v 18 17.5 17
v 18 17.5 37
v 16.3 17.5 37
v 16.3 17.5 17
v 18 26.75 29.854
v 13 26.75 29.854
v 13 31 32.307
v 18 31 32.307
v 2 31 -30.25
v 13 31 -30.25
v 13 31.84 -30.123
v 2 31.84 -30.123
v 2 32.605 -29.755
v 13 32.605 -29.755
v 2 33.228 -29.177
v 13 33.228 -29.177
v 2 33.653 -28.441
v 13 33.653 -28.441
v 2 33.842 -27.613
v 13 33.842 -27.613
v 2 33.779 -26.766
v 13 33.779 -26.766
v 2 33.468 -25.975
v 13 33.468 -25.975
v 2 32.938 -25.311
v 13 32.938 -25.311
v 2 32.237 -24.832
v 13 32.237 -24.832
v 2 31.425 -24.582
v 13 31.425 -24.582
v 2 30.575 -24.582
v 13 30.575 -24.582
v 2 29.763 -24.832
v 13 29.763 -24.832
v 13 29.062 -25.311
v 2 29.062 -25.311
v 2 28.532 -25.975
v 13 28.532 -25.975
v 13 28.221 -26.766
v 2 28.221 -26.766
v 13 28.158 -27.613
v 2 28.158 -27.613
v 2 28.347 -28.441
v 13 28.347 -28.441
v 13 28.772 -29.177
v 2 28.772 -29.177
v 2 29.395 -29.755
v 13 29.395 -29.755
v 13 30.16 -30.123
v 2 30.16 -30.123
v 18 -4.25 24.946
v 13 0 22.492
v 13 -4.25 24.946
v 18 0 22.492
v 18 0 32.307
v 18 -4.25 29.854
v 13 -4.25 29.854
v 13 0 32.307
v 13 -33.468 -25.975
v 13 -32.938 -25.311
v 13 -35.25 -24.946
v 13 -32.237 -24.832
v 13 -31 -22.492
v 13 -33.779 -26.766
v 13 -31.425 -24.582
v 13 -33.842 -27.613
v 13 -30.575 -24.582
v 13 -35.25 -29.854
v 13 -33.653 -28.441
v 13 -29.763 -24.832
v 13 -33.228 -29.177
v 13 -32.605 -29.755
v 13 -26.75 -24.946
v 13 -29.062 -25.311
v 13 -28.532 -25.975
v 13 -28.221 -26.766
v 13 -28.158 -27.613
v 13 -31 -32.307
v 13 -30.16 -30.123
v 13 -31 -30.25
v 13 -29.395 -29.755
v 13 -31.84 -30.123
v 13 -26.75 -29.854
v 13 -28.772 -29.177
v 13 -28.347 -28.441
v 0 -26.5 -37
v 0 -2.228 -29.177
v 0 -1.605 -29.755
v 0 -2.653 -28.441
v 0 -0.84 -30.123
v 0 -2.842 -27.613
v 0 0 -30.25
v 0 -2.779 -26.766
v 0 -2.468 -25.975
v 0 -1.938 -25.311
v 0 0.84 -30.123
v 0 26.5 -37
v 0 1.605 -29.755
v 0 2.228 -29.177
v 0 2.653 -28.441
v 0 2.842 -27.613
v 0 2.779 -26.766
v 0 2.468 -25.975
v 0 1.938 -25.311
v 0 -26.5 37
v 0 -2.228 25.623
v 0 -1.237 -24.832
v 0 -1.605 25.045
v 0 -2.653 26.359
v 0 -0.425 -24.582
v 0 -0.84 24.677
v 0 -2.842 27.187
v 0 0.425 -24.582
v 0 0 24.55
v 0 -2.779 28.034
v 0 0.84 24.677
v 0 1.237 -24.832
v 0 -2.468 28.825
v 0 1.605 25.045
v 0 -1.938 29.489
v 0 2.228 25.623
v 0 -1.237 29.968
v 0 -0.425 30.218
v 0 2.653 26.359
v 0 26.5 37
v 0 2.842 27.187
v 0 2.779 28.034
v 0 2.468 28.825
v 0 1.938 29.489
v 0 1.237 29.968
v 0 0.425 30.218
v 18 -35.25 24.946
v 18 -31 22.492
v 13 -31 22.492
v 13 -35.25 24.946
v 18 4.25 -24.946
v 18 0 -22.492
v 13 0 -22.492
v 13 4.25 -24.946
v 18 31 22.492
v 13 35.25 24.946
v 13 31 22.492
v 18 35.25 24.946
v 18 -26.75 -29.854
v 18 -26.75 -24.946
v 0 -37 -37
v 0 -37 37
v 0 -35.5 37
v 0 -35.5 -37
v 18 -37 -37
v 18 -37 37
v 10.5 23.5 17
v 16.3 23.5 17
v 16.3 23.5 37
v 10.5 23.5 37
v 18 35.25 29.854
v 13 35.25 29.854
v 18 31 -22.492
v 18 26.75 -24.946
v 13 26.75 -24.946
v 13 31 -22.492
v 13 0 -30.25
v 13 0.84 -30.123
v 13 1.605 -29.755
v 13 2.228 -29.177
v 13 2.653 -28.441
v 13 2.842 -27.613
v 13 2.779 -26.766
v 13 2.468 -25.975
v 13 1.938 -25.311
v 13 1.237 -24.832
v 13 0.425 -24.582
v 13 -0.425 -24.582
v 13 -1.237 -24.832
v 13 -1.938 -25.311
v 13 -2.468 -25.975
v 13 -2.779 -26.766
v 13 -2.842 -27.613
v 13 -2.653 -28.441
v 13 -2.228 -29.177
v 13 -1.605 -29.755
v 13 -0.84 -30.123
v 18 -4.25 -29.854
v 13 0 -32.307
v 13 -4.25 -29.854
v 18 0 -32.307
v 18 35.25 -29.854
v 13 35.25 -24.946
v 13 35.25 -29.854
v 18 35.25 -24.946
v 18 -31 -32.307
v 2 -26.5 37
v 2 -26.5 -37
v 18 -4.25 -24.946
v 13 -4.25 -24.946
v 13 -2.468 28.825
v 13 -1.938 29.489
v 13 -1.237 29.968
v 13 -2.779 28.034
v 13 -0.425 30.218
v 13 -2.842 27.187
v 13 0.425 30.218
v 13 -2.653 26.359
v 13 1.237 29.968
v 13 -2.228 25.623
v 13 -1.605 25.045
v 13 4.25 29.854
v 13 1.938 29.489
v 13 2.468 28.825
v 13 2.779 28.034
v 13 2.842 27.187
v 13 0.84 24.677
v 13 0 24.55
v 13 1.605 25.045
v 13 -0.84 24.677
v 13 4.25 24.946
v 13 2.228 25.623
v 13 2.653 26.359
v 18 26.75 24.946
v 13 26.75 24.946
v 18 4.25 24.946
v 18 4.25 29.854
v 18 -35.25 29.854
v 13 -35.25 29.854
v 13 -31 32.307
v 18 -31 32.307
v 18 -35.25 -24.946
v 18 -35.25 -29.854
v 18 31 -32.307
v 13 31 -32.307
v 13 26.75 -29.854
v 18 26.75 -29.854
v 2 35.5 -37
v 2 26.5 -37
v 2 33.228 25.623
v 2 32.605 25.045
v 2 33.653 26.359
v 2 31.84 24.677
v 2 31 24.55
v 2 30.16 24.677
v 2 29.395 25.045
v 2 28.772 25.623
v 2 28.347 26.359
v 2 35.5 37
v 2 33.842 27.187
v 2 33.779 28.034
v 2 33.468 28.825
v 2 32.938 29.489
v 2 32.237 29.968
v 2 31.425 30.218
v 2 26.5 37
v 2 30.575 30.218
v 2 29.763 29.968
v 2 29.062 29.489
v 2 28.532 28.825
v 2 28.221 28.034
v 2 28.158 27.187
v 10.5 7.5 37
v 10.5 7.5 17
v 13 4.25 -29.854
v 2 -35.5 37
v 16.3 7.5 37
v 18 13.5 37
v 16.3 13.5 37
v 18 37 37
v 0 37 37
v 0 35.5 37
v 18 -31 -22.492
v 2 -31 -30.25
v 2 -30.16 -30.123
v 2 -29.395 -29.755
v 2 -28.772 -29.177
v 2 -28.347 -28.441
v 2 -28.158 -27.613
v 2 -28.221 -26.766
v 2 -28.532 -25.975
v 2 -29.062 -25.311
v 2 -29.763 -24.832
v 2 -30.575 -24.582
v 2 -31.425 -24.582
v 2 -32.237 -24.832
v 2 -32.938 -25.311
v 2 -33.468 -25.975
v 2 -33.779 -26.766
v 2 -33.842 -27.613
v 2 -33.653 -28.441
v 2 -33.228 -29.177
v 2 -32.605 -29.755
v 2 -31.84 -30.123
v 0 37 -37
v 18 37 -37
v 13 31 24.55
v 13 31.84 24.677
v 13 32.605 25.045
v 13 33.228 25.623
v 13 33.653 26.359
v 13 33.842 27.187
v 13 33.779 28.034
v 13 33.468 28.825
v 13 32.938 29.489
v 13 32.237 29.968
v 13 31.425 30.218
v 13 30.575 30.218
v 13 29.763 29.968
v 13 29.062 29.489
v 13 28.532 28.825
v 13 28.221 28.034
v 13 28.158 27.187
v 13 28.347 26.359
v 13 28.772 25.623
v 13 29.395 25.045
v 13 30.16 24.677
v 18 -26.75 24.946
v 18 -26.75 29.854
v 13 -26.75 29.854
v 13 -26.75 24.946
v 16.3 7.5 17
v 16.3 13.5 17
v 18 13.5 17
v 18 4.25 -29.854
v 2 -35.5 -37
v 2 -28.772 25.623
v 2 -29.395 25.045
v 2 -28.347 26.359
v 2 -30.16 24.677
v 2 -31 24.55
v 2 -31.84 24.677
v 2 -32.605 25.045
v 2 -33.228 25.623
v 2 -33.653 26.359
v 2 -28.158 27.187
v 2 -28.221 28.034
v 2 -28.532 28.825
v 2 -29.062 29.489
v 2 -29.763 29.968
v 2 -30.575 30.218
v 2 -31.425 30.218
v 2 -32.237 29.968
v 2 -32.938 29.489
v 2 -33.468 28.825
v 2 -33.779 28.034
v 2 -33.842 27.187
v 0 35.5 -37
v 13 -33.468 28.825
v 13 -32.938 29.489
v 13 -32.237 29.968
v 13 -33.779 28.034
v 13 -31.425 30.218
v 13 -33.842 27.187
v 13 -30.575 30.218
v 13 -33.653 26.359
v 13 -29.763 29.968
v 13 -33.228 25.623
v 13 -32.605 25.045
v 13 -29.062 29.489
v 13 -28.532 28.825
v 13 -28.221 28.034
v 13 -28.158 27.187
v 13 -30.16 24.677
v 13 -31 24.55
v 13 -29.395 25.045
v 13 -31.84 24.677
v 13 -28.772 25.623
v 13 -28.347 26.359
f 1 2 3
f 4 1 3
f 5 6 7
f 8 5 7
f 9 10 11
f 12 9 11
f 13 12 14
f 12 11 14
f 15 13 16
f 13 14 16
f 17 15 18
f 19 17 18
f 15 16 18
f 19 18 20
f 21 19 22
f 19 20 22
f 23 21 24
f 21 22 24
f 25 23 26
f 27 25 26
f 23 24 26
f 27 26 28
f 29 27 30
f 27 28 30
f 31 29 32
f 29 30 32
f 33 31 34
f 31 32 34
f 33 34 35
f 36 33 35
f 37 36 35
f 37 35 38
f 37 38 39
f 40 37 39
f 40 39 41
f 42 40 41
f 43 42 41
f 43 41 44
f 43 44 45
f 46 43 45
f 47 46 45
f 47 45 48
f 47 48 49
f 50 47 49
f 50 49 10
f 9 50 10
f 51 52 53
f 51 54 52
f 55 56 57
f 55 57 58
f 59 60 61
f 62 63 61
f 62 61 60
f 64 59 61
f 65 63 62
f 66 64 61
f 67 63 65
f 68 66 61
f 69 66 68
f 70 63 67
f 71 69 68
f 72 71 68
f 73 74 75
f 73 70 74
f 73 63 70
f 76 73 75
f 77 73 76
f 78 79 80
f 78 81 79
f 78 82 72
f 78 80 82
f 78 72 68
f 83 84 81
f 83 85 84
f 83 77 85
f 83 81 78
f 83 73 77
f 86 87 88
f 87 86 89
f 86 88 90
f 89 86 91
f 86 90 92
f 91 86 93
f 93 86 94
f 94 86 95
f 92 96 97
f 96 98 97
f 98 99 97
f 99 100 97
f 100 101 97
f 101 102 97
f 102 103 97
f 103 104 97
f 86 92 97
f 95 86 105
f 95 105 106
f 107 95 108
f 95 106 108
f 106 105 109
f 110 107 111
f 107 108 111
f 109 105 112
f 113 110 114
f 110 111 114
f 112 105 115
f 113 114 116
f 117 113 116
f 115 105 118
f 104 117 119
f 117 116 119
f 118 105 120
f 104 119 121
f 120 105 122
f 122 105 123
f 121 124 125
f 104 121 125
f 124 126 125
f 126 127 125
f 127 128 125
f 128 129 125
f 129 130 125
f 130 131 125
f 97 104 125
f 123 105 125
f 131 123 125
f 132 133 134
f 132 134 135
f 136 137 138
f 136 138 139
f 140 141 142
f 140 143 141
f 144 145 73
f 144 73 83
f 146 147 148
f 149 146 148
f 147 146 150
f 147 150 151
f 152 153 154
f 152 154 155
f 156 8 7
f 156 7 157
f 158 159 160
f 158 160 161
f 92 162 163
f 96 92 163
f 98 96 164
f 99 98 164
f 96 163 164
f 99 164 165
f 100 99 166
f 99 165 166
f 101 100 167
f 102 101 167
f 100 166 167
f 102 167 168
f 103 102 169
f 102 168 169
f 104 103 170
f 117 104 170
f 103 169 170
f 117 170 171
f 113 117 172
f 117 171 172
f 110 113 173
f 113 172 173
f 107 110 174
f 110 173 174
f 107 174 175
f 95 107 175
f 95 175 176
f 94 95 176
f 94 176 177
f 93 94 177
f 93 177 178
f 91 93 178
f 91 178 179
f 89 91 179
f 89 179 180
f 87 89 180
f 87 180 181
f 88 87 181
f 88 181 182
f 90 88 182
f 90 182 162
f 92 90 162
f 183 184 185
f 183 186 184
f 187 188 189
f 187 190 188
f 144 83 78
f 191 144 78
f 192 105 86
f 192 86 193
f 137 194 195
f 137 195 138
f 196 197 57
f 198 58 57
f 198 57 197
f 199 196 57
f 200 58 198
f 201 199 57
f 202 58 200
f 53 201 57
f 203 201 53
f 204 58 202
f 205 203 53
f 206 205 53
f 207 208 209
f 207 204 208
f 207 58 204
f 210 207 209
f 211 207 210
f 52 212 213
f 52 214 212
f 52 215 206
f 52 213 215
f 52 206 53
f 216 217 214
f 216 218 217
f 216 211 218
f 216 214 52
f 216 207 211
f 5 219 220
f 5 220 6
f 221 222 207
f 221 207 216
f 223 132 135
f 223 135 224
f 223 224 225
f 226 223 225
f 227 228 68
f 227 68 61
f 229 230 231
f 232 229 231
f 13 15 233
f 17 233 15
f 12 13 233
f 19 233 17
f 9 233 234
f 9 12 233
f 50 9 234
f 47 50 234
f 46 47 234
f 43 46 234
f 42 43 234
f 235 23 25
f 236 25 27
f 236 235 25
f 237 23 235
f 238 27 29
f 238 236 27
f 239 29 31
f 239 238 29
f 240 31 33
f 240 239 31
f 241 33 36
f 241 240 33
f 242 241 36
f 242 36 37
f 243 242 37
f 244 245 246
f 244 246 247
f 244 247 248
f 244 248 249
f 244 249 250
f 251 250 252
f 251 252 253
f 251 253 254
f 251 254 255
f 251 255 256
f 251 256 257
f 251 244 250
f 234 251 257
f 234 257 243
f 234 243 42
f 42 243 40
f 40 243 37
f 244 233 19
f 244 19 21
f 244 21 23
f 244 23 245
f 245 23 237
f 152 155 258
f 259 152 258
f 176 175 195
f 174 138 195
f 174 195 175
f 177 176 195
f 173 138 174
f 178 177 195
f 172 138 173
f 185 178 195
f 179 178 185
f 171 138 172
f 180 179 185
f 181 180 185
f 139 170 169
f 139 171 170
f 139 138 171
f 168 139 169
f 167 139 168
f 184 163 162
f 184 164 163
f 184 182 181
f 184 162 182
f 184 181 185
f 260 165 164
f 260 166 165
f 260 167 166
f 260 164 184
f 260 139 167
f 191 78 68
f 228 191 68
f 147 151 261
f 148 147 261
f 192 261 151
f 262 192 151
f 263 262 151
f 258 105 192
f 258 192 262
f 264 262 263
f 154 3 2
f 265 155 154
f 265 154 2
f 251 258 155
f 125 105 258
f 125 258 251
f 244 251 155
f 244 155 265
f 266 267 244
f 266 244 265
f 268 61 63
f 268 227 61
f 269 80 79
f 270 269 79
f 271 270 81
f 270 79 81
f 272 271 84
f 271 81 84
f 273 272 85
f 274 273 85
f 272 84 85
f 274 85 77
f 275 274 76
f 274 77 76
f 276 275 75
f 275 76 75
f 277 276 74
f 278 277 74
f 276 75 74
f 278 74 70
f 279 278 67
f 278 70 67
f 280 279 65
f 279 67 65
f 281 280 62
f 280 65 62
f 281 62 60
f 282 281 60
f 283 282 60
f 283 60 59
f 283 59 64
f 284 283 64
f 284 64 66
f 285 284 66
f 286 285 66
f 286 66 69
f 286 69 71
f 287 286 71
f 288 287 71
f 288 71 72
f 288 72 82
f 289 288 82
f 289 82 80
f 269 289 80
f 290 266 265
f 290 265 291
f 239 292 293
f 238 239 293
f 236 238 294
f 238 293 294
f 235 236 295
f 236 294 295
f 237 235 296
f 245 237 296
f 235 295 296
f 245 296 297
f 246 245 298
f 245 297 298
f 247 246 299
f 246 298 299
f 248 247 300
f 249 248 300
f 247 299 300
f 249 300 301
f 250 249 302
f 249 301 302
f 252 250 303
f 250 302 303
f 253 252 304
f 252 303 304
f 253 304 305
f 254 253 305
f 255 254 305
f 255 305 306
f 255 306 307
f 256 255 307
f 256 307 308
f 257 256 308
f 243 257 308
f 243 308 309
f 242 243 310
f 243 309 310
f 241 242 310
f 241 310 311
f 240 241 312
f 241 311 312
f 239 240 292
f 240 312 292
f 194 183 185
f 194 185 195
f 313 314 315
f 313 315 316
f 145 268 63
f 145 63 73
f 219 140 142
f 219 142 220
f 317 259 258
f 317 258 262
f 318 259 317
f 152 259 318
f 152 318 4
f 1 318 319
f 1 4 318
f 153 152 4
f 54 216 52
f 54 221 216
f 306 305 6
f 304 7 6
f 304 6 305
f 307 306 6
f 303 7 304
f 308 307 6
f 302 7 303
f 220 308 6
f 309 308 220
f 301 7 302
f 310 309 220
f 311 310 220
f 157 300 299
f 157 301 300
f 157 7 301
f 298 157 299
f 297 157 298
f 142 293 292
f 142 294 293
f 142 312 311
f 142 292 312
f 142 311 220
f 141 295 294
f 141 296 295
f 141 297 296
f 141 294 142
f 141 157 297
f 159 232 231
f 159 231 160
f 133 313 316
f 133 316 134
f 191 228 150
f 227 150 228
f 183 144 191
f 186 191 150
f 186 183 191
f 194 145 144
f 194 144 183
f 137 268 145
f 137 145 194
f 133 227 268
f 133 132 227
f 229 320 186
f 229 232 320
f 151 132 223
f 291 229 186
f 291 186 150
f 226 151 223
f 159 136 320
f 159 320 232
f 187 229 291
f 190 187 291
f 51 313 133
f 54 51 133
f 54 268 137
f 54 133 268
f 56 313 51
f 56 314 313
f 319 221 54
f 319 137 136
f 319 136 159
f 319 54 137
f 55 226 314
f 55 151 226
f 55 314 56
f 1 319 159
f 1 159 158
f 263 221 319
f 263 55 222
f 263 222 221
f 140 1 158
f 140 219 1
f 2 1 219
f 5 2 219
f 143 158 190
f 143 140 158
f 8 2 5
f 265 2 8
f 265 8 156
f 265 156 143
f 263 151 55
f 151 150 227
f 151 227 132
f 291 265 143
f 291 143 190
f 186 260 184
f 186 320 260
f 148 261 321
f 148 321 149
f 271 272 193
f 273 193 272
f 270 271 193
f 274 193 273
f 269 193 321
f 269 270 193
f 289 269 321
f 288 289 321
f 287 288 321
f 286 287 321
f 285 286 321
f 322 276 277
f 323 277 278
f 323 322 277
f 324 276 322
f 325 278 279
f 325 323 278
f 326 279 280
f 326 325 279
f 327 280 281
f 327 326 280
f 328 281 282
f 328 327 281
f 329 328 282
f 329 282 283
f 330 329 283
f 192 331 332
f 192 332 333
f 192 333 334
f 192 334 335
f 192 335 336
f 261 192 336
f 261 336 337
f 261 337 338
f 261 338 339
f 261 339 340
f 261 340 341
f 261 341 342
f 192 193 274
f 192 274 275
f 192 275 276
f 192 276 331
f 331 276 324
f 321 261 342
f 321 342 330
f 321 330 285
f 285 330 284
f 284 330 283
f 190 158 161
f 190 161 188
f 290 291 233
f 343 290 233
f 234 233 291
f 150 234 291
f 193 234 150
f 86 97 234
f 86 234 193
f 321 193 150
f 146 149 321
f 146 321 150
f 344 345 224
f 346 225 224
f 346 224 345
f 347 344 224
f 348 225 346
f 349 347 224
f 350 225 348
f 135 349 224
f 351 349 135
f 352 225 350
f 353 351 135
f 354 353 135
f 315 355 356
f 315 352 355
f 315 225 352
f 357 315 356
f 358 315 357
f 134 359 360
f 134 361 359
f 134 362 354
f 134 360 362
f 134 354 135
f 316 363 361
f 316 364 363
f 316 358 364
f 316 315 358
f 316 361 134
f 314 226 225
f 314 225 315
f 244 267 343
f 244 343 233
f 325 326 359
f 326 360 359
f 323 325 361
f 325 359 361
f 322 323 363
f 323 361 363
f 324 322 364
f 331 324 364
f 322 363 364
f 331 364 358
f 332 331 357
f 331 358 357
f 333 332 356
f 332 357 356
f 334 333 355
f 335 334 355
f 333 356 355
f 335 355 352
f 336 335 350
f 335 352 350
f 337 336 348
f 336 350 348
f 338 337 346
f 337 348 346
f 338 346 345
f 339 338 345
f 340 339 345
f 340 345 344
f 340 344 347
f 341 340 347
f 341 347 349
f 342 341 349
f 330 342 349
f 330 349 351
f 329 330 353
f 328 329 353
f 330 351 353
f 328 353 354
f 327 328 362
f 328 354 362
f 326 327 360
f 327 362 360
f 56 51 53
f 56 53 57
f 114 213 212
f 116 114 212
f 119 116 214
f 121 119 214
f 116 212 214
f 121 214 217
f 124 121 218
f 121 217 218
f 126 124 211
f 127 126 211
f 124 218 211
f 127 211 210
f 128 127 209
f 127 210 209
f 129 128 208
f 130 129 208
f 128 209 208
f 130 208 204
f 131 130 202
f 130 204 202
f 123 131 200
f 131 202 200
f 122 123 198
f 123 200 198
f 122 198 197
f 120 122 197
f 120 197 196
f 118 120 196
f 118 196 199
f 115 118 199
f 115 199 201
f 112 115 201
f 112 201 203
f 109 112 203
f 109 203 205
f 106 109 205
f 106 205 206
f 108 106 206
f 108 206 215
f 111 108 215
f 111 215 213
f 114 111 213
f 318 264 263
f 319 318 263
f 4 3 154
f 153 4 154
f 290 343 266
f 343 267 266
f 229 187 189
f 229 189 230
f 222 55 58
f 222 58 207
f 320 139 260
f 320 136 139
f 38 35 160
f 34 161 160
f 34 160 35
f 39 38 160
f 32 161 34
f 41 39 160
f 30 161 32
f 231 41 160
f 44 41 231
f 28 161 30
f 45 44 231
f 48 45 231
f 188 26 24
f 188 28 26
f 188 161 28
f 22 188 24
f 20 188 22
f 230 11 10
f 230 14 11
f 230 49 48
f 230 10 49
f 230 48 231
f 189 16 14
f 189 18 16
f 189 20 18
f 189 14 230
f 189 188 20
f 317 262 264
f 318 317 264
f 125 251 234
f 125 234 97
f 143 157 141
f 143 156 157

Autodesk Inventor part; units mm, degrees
ref_plane "YZ Plane" through (0, 0, 0) normal (1, 0, 0) x (0, 1, 0)
ref_plane "XZ Plane" through (0, 0, 0) normal (0, 1, 0) x (-1, 0, 0)
ref_plane "XY Plane" through (0, 0, 0) normal (0, 0, 1) x (1, 0, 0)
sketch "Szkic1" plane through (0, 0, 0) normal (1, 0, 0) x (0, 1, 0)
  line L0 (-37, 37) -> (37, 37)
  line L1 (37, 37) -> (37, -37)
  line L2 (37, -37) -> (-37, -37)
  line L3 (-37, -37) -> (-37, 37)
  line L4 (-37, 37) -> (37, -37) construction
  line L5 (37, 37) -> (-37, -37) construction
  point P0 (0, 0)
  dimension "d0" = 74
  dimension "d1" = 74
extrude "Wyciągnięcie proste1" add sketch "Szkic1" along normal blind 18
sketch "Szkic2" plane through (18, 0, 0) normal (1, 0, 0) x (0, 0, -1)
  circle A0 centre (-27.4, 31) radius 2.85
  line L0 (37, 37) -> (-37, 37) projected
  line L1 (-37, 37) -> (-37, -37) projected
  circle A1 centre (-27.4, 0) radius 2.85
  circle A2 centre (-27.4, -31) radius 2.85
  circle A3 centre (27.4, 31) radius 2.85
  line L2 (37, -37) -> (37, 37) projected
  circle A4 centre (27.4, 0) radius 2.85
  circle A5 centre (27.4, -31) radius 2.85
  line L3 (-29.8537, 35.25) -> (-24.9463, 35.25)
  line L4 (-24.9463, 35.25) -> (-22.4925, 31)
  line L5 (-22.4925, 31) -> (-24.9463, 26.75)
  line L6 (-24.9463, 26.75) -> (-29.8537, 26.75)
  line L7 (-29.8537, 26.75) -> (-32.3075, 31)
  line L8 (-32.3075, 31) -> (-29.8537, 35.25)
  line L9 (-29.8537, 4.25) -> (-24.9463, 4.25)
  line L10 (-24.9463, 4.25) -> (-22.4925, 0)
  line L11 (-22.4925, 0) -> (-24.9463, -4.25)
  line L12 (-24.9463, -4.25) -> (-29.8537, -4.25)
  line L13 (-29.8537, -4.25) -> (-32.3075, 0)
  line L14 (-32.3075, 0) -> (-29.8537, 4.25)
  line L15 (-29.8537, -26.75) -> (-24.9463, -26.75)
  line L16 (-24.9463, -26.75) -> (-22.4925, -31)
  line L17 (-22.4925, -31) -> (-24.9463, -35.25)
  line L18 (-24.9463, -35.25) -> (-29.8537, -35.25)
  line L19 (-29.8537, -35.25) -> (-32.3075, -31)
  line L20 (-32.3075, -31) -> (-29.8537, -26.75)
  line L21 (29.8537, 35.25) -> (32.3075, 31)
  line L22 (32.3075, 31) -> (29.8537, 26.75)
  line L23 (29.8537, 26.75) -> (24.9463, 26.75)
  line L24 (24.9463, 26.75) -> (22.4925, 31)
  line L25 (22.4925, 31) -> (24.9463, 35.25)
  line L26 (24.9463, 35.25) -> (29.8537, 35.25)
  line L27 (29.8537, 4.25) -> (32.3075, 0)
  line L28 (32.3075, 0) -> (29.8537, -4.25)
  line L29 (29.8537, -4.25) -> (24.9463, -4.25)
  line L30 (24.9463, -4.25) -> (22.4925, 0)
  line L31 (22.4925, 0) -> (24.9463, 4.25)
  line L32 (24.9463, 4.25) -> (29.8537, 4.25)
  line L33 (29.8537, -26.75) -> (32.3075, -31)
  line L34 (32.3075, -31) -> (29.8537, -35.25)
  line L35 (29.8537, -35.25) -> (24.9463, -35.25)
  line L36 (24.9463, -35.25) -> (22.4925, -31)
  line L37 (22.4925, -31) -> (24.9463, -26.75)
  line L38 (24.9463, -26.75) -> (29.8537, -26.75)
  point P0 (0, 0)
  point P1 (27.4, -26.75)
  dimension "d4" = 6
  dimension "d5" = 5.7
  dimension "d6" = 9.6
  dimension "d7" = 31
  dimension "d8" = 31
  dimension "d9" = 5.7
  dimension "d10" = 5.7
  dimension "d11" = 9.6
  dimension "d12" = 5.7
  dimension "d13" = 5.7
  dimension "d14" = 5.7
  dimension "d15" = 8.5
  dimension "d16" = 8.5
  dimension "d17" = 8.5
  dimension "d18" = 8.5
  dimension "d19" = 8.5
  dimension "d20" = 8.5
extrude "Wyciągnięcie proste2" cut sketch "Szkic2" against normal through all contours A0 | A1 | A2 | A3 | A4 | A5
extrude "Wyciągnięcie proste3" cut sketch "Szkic2" against normal blind 5 contours A0 | A1 | A2 | A3 | A4 | A5 | L3 L4 L5 L6 L7 L8 | L9 L10 L11 L12 L13 L14 | L15 L16 L17 L18 L19 L20 | L21 L22 L23 L24 L25 L26 | L27 L28 L29 L30 L31 L32 | L33 L34 L35 L36 L37 L38
sketch "Szkic3" plane through (0, -37, 37) normal (0, 0, 1) x (1, 0, 0)
  line L0 (0, 0) -> (0, 74) projected
  line L1 (0, 72.5) -> (2, 72.5)
  line L2 (2, 72.5) -> (2, 63.5)
  line L3 (2, 63.5) -> (0, 63.5)
  line L4 (0, 63.5) -> (0, 72.5)
  line L5 (0, 74) -> (18, 74) projected
  line L6 (0, 10.5) -> (2, 10.5)
  line L7 (2, 10.5) -> (2, 1.5)
  line L8 (2, 1.5) -> (0, 1.5)
  line L9 (0, 1.5) -> (0, 10.5)
  point P0 (0, 37)
  point P1 (0, 1.5)
  point P2 (0, 63.5)
  dimension "d25" = 1.5
  dimension "d26" = 9
  dimension "d27" = 2
  dimension "d28" = 2
  dimension "d29" = 9
  dimension "d30" = 1.5
extrude "Wyciągnięcie proste4" cut sketch "Szkic3" against normal through all
sketch "Szkic4" plane through (0, -37, 37) normal (0, 0, 1) x (1, 0, 0)
  line L0 (10.5, 60.5) -> (10.5, 44.5)
  line L1 (10.5, 44.5) -> (16.3, 44.5)
  line L2 (16.3, 44.5) -> (16.3, 50.5)
  line L3 (16.3, 60.5) -> (10.5, 60.5)
  line L4 (16.3, 50.5) -> (18, 50.5)
  line L5 (18, 50.5) -> (18, 54.5)
  line L6 (18, 54.5) -> (16.3, 54.5)
  line L7 (16.3, 54.5) -> (16.3, 60.5)
  line L8 (16.3, 50.5) -> (16.3, 54.5) construction
  line L9 (18, 74) -> (18, 0) projected
  line L10 (18, 63.75) -> (13, 63.75) projected
  line L11 (18, 63.75) -> (13, 63.75) projected
  point P0 (0, 37)
  dimension "d33" = 5.8
  dimension "d34" = 4
  dimension "d35" = 1.7
  dimension "d36" = 6
  dimension "d37" = 16
  dimension "d38" = 3.25
extrude "Wyciągnięcie proste5" cut sketch "Szkic4" against normal blind 20
properties part number "XItemEndCoverConnector" material "Tworzywo sztuczne ABS"
